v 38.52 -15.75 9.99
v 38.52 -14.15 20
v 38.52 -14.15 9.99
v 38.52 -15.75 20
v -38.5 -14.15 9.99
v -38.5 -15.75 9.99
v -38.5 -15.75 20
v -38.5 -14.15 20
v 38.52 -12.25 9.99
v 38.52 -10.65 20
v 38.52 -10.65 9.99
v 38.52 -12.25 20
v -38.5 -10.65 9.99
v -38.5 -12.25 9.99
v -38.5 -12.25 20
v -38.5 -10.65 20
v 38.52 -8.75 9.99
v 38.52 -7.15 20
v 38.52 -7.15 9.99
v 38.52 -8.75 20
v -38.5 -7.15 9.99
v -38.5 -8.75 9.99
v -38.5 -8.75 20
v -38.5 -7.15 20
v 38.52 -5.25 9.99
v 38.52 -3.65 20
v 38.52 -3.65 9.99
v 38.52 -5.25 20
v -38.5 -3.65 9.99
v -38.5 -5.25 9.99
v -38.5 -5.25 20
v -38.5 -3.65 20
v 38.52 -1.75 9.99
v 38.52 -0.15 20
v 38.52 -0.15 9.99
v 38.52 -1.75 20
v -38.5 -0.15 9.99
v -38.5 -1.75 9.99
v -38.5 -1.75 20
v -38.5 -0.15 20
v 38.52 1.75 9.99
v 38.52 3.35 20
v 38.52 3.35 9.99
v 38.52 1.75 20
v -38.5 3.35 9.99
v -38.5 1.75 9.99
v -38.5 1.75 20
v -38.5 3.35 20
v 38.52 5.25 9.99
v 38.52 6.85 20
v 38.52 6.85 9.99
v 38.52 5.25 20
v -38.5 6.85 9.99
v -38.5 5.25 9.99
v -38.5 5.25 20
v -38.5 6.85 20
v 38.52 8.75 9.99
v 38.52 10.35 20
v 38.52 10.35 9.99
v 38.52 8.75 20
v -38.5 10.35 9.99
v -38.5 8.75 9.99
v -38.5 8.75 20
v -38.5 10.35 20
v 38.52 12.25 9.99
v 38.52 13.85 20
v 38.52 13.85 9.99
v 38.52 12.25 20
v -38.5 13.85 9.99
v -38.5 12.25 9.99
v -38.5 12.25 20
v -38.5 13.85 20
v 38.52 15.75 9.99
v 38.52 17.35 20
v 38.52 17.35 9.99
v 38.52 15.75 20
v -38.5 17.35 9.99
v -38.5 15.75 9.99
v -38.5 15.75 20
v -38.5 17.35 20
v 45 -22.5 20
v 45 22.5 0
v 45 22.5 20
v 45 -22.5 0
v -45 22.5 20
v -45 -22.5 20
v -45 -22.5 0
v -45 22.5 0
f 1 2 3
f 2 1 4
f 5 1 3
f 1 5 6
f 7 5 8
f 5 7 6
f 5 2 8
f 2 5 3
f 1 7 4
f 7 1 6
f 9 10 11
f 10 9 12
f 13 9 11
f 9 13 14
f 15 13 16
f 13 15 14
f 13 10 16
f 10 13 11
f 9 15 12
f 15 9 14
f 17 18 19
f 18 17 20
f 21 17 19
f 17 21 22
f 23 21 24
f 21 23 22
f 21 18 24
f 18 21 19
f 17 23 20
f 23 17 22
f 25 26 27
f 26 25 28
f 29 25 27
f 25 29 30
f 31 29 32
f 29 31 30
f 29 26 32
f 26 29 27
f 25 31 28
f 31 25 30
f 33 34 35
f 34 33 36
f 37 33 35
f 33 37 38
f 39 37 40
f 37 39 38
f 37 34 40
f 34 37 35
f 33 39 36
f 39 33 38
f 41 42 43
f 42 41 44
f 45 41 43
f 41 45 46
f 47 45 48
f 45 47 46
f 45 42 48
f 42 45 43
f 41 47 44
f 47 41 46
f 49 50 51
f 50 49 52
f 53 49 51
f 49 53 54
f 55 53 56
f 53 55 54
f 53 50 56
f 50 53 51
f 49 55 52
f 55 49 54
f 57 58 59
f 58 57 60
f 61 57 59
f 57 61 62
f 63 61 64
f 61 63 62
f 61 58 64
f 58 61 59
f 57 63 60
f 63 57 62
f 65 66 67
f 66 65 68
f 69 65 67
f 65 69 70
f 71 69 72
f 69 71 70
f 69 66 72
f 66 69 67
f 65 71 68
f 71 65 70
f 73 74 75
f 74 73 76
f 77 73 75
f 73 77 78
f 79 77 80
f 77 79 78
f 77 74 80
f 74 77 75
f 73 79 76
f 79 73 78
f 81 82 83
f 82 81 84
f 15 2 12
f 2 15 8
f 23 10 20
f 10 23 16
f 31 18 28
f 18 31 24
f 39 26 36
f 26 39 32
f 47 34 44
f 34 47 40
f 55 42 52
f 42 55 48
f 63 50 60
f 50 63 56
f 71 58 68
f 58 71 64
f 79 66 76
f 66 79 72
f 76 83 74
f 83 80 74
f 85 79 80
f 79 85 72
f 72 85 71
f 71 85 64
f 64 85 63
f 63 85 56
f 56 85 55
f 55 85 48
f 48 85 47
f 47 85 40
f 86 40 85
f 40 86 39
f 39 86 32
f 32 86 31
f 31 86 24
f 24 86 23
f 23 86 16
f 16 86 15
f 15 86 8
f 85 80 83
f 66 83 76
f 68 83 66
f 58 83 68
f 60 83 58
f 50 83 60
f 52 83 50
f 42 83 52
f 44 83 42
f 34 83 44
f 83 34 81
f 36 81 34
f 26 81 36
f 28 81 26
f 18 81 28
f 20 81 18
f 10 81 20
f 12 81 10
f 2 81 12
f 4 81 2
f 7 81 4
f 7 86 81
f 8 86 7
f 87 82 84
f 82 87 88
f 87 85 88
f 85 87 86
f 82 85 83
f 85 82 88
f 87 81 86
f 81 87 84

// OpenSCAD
// Drying Rack for 10 Microscope Slides
// Dimensions measured with calipers

// Base block dimensions
base_length = 90;   // X
base_width  = 45;   // Y
base_height = 20;   // Z

// Slot dimensions
slot_length = 77;   // X
slot_width  = 1.6;  // Y
slot_depth  = 10;   // Z

// Slot arrangement
num_slots = 10;
slot_spacing = 3.5; // centre-to-centre in Y

// Rendering quality
$fn = 64;

// Calculate total width of the slot group
total_slot_group_width = (num_slots - 1) * slot_spacing;

// Start Y position so the group is centred on the block
start_y = -total_slot_group_width / 2;

// Build the solid base
difference() {
    // Main block, centred on origin in X and Y, sitting on z=0
    translate([-base_length/2, -base_width/2, 0])
        cube([base_length, base_width, base_height]);

    // Cut out the 10 slots
    for (i = [0 : num_slots - 1]) {
        y_pos = start_y + i * slot_spacing;
        
        // Slot extends slightly past the block in X to ensure clean cut
        translate([
            -slot_length/2, 
            y_pos, 
            base_height - slot_depth - 0.01 // extend 0.01mm past the bottom of the cut
        ])
        cube([
            slot_length + 0.02, // extend 0.01mm past each side in X
            slot_width, 
            slot_depth + 0.02   // extend 0.01mm past the top and bottom
        ]);
    }
}
